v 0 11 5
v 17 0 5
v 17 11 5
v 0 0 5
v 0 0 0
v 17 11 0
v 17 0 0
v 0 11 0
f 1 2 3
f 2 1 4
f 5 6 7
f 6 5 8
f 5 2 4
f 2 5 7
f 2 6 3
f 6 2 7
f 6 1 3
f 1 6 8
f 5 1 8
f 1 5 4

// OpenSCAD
// Generated by SolidPython 1.0.1 on 2020-07-29 00:46:56


cube(size = [17, 11, 5]);
/***********************************************
*********      SolidPython code:      **********
************************************************
 
# import packages: SolidPython
from solid import *
from solid.utils import *
from itertools import chain, combinations, permutations


class Resize:

    def __init__(self, scad_file):
        self.scad_file = scad_file
        #self.scad_file = import_scad(scad_file)
        # cone/cylinder param:
        self.r1 = 0
        self.r2 = 0
        self.h = 0
        # rectangular prism param:
        self.w = 0
        self.l = 0
        # ellipse param:
        self.r = 0

    # import OpenScad code (file name corresponds to shape)


    # classify shape + parameters
    def assign(self, param1, param2, param3):
        if self.scad_file == 'cone.scad':
            self.r1 = param1
            self.r2 = param2
            self.h = param3
        elif self.scad_file == 'cylinder.scad':
            self.r1 = param1
            self.r2 = param2
            self.h = param3
        elif self.scad_file == 'rectangularPrism.scad':
            self.h = param1
            self.l = param2
            self.w = param3
        else:
            self.r = param1
            self.h = param2

    # resize parameters
    def iterate(self):
        x = range(3, 20, 2)
        i = 1
        if self.scad_file == 'cone.scad':
            tempList = list(permutations(x, 2))
            for temp in tempList:
                param1 = temp[0]
                param2 = temp[1]
                filepath = 'produced_scad_files/' + 'cone' + str(param1) + '_' + str(param2) + '_' + '.scad'
                scad_render_to_file(cylinder(h=param1, r1=param2, r2=0), filepath)

        elif self.scad_file == 'cylinder.scad':
            tempList = list(permutations(x, 3))
            for temp in tempList:
                param1 = temp[0]
                param2 = temp[1]
                filepath = 'produced_scad_files/' + 'cylinder' + str(param1) + '_' + str(param2) + '_' + '.scad'
                scad_render_to_file(cylinder(h=param1, r1=param2, r2=param2), filepath)

        elif self.scad_file == 'rectangularPrism.scad':
            tempList = list(permutations(x, 3))
            for temp in tempList:
                param1 = temp[0]
                param2 = temp[1]
                param3 = temp[2]
                filepath = 'produced_scad_files/' + 'rectangularPrism' + str(param1) + '_' + str(param2) + '_' + str(
                    param3) + '.scad'
                scad_render_to_file(cube(size=(param1, param2, param3)), filepath)

        elif self.scad_file == 'ellipse.scad':
            tempList = list(permutations(x, 4))
            for temp in tempList:
                param1 = temp[0]
                param2 = temp[1]
                param3 = temp[2]
                param4 = temp[3]
                filepath = 'produced_scad_files/' + 'ellipse' + str(param1) + '_' + str(param2) + '_' + str(param3) + '_' + str(param4) + '.scad'
                scad_render_to_file(scale([param1, param2, param3])(sphere(r=param4)), filepath)

    def render_to_scadfile(self):
        scad_render_to_file(scad, 'example.scad') 
 
************************************************/
